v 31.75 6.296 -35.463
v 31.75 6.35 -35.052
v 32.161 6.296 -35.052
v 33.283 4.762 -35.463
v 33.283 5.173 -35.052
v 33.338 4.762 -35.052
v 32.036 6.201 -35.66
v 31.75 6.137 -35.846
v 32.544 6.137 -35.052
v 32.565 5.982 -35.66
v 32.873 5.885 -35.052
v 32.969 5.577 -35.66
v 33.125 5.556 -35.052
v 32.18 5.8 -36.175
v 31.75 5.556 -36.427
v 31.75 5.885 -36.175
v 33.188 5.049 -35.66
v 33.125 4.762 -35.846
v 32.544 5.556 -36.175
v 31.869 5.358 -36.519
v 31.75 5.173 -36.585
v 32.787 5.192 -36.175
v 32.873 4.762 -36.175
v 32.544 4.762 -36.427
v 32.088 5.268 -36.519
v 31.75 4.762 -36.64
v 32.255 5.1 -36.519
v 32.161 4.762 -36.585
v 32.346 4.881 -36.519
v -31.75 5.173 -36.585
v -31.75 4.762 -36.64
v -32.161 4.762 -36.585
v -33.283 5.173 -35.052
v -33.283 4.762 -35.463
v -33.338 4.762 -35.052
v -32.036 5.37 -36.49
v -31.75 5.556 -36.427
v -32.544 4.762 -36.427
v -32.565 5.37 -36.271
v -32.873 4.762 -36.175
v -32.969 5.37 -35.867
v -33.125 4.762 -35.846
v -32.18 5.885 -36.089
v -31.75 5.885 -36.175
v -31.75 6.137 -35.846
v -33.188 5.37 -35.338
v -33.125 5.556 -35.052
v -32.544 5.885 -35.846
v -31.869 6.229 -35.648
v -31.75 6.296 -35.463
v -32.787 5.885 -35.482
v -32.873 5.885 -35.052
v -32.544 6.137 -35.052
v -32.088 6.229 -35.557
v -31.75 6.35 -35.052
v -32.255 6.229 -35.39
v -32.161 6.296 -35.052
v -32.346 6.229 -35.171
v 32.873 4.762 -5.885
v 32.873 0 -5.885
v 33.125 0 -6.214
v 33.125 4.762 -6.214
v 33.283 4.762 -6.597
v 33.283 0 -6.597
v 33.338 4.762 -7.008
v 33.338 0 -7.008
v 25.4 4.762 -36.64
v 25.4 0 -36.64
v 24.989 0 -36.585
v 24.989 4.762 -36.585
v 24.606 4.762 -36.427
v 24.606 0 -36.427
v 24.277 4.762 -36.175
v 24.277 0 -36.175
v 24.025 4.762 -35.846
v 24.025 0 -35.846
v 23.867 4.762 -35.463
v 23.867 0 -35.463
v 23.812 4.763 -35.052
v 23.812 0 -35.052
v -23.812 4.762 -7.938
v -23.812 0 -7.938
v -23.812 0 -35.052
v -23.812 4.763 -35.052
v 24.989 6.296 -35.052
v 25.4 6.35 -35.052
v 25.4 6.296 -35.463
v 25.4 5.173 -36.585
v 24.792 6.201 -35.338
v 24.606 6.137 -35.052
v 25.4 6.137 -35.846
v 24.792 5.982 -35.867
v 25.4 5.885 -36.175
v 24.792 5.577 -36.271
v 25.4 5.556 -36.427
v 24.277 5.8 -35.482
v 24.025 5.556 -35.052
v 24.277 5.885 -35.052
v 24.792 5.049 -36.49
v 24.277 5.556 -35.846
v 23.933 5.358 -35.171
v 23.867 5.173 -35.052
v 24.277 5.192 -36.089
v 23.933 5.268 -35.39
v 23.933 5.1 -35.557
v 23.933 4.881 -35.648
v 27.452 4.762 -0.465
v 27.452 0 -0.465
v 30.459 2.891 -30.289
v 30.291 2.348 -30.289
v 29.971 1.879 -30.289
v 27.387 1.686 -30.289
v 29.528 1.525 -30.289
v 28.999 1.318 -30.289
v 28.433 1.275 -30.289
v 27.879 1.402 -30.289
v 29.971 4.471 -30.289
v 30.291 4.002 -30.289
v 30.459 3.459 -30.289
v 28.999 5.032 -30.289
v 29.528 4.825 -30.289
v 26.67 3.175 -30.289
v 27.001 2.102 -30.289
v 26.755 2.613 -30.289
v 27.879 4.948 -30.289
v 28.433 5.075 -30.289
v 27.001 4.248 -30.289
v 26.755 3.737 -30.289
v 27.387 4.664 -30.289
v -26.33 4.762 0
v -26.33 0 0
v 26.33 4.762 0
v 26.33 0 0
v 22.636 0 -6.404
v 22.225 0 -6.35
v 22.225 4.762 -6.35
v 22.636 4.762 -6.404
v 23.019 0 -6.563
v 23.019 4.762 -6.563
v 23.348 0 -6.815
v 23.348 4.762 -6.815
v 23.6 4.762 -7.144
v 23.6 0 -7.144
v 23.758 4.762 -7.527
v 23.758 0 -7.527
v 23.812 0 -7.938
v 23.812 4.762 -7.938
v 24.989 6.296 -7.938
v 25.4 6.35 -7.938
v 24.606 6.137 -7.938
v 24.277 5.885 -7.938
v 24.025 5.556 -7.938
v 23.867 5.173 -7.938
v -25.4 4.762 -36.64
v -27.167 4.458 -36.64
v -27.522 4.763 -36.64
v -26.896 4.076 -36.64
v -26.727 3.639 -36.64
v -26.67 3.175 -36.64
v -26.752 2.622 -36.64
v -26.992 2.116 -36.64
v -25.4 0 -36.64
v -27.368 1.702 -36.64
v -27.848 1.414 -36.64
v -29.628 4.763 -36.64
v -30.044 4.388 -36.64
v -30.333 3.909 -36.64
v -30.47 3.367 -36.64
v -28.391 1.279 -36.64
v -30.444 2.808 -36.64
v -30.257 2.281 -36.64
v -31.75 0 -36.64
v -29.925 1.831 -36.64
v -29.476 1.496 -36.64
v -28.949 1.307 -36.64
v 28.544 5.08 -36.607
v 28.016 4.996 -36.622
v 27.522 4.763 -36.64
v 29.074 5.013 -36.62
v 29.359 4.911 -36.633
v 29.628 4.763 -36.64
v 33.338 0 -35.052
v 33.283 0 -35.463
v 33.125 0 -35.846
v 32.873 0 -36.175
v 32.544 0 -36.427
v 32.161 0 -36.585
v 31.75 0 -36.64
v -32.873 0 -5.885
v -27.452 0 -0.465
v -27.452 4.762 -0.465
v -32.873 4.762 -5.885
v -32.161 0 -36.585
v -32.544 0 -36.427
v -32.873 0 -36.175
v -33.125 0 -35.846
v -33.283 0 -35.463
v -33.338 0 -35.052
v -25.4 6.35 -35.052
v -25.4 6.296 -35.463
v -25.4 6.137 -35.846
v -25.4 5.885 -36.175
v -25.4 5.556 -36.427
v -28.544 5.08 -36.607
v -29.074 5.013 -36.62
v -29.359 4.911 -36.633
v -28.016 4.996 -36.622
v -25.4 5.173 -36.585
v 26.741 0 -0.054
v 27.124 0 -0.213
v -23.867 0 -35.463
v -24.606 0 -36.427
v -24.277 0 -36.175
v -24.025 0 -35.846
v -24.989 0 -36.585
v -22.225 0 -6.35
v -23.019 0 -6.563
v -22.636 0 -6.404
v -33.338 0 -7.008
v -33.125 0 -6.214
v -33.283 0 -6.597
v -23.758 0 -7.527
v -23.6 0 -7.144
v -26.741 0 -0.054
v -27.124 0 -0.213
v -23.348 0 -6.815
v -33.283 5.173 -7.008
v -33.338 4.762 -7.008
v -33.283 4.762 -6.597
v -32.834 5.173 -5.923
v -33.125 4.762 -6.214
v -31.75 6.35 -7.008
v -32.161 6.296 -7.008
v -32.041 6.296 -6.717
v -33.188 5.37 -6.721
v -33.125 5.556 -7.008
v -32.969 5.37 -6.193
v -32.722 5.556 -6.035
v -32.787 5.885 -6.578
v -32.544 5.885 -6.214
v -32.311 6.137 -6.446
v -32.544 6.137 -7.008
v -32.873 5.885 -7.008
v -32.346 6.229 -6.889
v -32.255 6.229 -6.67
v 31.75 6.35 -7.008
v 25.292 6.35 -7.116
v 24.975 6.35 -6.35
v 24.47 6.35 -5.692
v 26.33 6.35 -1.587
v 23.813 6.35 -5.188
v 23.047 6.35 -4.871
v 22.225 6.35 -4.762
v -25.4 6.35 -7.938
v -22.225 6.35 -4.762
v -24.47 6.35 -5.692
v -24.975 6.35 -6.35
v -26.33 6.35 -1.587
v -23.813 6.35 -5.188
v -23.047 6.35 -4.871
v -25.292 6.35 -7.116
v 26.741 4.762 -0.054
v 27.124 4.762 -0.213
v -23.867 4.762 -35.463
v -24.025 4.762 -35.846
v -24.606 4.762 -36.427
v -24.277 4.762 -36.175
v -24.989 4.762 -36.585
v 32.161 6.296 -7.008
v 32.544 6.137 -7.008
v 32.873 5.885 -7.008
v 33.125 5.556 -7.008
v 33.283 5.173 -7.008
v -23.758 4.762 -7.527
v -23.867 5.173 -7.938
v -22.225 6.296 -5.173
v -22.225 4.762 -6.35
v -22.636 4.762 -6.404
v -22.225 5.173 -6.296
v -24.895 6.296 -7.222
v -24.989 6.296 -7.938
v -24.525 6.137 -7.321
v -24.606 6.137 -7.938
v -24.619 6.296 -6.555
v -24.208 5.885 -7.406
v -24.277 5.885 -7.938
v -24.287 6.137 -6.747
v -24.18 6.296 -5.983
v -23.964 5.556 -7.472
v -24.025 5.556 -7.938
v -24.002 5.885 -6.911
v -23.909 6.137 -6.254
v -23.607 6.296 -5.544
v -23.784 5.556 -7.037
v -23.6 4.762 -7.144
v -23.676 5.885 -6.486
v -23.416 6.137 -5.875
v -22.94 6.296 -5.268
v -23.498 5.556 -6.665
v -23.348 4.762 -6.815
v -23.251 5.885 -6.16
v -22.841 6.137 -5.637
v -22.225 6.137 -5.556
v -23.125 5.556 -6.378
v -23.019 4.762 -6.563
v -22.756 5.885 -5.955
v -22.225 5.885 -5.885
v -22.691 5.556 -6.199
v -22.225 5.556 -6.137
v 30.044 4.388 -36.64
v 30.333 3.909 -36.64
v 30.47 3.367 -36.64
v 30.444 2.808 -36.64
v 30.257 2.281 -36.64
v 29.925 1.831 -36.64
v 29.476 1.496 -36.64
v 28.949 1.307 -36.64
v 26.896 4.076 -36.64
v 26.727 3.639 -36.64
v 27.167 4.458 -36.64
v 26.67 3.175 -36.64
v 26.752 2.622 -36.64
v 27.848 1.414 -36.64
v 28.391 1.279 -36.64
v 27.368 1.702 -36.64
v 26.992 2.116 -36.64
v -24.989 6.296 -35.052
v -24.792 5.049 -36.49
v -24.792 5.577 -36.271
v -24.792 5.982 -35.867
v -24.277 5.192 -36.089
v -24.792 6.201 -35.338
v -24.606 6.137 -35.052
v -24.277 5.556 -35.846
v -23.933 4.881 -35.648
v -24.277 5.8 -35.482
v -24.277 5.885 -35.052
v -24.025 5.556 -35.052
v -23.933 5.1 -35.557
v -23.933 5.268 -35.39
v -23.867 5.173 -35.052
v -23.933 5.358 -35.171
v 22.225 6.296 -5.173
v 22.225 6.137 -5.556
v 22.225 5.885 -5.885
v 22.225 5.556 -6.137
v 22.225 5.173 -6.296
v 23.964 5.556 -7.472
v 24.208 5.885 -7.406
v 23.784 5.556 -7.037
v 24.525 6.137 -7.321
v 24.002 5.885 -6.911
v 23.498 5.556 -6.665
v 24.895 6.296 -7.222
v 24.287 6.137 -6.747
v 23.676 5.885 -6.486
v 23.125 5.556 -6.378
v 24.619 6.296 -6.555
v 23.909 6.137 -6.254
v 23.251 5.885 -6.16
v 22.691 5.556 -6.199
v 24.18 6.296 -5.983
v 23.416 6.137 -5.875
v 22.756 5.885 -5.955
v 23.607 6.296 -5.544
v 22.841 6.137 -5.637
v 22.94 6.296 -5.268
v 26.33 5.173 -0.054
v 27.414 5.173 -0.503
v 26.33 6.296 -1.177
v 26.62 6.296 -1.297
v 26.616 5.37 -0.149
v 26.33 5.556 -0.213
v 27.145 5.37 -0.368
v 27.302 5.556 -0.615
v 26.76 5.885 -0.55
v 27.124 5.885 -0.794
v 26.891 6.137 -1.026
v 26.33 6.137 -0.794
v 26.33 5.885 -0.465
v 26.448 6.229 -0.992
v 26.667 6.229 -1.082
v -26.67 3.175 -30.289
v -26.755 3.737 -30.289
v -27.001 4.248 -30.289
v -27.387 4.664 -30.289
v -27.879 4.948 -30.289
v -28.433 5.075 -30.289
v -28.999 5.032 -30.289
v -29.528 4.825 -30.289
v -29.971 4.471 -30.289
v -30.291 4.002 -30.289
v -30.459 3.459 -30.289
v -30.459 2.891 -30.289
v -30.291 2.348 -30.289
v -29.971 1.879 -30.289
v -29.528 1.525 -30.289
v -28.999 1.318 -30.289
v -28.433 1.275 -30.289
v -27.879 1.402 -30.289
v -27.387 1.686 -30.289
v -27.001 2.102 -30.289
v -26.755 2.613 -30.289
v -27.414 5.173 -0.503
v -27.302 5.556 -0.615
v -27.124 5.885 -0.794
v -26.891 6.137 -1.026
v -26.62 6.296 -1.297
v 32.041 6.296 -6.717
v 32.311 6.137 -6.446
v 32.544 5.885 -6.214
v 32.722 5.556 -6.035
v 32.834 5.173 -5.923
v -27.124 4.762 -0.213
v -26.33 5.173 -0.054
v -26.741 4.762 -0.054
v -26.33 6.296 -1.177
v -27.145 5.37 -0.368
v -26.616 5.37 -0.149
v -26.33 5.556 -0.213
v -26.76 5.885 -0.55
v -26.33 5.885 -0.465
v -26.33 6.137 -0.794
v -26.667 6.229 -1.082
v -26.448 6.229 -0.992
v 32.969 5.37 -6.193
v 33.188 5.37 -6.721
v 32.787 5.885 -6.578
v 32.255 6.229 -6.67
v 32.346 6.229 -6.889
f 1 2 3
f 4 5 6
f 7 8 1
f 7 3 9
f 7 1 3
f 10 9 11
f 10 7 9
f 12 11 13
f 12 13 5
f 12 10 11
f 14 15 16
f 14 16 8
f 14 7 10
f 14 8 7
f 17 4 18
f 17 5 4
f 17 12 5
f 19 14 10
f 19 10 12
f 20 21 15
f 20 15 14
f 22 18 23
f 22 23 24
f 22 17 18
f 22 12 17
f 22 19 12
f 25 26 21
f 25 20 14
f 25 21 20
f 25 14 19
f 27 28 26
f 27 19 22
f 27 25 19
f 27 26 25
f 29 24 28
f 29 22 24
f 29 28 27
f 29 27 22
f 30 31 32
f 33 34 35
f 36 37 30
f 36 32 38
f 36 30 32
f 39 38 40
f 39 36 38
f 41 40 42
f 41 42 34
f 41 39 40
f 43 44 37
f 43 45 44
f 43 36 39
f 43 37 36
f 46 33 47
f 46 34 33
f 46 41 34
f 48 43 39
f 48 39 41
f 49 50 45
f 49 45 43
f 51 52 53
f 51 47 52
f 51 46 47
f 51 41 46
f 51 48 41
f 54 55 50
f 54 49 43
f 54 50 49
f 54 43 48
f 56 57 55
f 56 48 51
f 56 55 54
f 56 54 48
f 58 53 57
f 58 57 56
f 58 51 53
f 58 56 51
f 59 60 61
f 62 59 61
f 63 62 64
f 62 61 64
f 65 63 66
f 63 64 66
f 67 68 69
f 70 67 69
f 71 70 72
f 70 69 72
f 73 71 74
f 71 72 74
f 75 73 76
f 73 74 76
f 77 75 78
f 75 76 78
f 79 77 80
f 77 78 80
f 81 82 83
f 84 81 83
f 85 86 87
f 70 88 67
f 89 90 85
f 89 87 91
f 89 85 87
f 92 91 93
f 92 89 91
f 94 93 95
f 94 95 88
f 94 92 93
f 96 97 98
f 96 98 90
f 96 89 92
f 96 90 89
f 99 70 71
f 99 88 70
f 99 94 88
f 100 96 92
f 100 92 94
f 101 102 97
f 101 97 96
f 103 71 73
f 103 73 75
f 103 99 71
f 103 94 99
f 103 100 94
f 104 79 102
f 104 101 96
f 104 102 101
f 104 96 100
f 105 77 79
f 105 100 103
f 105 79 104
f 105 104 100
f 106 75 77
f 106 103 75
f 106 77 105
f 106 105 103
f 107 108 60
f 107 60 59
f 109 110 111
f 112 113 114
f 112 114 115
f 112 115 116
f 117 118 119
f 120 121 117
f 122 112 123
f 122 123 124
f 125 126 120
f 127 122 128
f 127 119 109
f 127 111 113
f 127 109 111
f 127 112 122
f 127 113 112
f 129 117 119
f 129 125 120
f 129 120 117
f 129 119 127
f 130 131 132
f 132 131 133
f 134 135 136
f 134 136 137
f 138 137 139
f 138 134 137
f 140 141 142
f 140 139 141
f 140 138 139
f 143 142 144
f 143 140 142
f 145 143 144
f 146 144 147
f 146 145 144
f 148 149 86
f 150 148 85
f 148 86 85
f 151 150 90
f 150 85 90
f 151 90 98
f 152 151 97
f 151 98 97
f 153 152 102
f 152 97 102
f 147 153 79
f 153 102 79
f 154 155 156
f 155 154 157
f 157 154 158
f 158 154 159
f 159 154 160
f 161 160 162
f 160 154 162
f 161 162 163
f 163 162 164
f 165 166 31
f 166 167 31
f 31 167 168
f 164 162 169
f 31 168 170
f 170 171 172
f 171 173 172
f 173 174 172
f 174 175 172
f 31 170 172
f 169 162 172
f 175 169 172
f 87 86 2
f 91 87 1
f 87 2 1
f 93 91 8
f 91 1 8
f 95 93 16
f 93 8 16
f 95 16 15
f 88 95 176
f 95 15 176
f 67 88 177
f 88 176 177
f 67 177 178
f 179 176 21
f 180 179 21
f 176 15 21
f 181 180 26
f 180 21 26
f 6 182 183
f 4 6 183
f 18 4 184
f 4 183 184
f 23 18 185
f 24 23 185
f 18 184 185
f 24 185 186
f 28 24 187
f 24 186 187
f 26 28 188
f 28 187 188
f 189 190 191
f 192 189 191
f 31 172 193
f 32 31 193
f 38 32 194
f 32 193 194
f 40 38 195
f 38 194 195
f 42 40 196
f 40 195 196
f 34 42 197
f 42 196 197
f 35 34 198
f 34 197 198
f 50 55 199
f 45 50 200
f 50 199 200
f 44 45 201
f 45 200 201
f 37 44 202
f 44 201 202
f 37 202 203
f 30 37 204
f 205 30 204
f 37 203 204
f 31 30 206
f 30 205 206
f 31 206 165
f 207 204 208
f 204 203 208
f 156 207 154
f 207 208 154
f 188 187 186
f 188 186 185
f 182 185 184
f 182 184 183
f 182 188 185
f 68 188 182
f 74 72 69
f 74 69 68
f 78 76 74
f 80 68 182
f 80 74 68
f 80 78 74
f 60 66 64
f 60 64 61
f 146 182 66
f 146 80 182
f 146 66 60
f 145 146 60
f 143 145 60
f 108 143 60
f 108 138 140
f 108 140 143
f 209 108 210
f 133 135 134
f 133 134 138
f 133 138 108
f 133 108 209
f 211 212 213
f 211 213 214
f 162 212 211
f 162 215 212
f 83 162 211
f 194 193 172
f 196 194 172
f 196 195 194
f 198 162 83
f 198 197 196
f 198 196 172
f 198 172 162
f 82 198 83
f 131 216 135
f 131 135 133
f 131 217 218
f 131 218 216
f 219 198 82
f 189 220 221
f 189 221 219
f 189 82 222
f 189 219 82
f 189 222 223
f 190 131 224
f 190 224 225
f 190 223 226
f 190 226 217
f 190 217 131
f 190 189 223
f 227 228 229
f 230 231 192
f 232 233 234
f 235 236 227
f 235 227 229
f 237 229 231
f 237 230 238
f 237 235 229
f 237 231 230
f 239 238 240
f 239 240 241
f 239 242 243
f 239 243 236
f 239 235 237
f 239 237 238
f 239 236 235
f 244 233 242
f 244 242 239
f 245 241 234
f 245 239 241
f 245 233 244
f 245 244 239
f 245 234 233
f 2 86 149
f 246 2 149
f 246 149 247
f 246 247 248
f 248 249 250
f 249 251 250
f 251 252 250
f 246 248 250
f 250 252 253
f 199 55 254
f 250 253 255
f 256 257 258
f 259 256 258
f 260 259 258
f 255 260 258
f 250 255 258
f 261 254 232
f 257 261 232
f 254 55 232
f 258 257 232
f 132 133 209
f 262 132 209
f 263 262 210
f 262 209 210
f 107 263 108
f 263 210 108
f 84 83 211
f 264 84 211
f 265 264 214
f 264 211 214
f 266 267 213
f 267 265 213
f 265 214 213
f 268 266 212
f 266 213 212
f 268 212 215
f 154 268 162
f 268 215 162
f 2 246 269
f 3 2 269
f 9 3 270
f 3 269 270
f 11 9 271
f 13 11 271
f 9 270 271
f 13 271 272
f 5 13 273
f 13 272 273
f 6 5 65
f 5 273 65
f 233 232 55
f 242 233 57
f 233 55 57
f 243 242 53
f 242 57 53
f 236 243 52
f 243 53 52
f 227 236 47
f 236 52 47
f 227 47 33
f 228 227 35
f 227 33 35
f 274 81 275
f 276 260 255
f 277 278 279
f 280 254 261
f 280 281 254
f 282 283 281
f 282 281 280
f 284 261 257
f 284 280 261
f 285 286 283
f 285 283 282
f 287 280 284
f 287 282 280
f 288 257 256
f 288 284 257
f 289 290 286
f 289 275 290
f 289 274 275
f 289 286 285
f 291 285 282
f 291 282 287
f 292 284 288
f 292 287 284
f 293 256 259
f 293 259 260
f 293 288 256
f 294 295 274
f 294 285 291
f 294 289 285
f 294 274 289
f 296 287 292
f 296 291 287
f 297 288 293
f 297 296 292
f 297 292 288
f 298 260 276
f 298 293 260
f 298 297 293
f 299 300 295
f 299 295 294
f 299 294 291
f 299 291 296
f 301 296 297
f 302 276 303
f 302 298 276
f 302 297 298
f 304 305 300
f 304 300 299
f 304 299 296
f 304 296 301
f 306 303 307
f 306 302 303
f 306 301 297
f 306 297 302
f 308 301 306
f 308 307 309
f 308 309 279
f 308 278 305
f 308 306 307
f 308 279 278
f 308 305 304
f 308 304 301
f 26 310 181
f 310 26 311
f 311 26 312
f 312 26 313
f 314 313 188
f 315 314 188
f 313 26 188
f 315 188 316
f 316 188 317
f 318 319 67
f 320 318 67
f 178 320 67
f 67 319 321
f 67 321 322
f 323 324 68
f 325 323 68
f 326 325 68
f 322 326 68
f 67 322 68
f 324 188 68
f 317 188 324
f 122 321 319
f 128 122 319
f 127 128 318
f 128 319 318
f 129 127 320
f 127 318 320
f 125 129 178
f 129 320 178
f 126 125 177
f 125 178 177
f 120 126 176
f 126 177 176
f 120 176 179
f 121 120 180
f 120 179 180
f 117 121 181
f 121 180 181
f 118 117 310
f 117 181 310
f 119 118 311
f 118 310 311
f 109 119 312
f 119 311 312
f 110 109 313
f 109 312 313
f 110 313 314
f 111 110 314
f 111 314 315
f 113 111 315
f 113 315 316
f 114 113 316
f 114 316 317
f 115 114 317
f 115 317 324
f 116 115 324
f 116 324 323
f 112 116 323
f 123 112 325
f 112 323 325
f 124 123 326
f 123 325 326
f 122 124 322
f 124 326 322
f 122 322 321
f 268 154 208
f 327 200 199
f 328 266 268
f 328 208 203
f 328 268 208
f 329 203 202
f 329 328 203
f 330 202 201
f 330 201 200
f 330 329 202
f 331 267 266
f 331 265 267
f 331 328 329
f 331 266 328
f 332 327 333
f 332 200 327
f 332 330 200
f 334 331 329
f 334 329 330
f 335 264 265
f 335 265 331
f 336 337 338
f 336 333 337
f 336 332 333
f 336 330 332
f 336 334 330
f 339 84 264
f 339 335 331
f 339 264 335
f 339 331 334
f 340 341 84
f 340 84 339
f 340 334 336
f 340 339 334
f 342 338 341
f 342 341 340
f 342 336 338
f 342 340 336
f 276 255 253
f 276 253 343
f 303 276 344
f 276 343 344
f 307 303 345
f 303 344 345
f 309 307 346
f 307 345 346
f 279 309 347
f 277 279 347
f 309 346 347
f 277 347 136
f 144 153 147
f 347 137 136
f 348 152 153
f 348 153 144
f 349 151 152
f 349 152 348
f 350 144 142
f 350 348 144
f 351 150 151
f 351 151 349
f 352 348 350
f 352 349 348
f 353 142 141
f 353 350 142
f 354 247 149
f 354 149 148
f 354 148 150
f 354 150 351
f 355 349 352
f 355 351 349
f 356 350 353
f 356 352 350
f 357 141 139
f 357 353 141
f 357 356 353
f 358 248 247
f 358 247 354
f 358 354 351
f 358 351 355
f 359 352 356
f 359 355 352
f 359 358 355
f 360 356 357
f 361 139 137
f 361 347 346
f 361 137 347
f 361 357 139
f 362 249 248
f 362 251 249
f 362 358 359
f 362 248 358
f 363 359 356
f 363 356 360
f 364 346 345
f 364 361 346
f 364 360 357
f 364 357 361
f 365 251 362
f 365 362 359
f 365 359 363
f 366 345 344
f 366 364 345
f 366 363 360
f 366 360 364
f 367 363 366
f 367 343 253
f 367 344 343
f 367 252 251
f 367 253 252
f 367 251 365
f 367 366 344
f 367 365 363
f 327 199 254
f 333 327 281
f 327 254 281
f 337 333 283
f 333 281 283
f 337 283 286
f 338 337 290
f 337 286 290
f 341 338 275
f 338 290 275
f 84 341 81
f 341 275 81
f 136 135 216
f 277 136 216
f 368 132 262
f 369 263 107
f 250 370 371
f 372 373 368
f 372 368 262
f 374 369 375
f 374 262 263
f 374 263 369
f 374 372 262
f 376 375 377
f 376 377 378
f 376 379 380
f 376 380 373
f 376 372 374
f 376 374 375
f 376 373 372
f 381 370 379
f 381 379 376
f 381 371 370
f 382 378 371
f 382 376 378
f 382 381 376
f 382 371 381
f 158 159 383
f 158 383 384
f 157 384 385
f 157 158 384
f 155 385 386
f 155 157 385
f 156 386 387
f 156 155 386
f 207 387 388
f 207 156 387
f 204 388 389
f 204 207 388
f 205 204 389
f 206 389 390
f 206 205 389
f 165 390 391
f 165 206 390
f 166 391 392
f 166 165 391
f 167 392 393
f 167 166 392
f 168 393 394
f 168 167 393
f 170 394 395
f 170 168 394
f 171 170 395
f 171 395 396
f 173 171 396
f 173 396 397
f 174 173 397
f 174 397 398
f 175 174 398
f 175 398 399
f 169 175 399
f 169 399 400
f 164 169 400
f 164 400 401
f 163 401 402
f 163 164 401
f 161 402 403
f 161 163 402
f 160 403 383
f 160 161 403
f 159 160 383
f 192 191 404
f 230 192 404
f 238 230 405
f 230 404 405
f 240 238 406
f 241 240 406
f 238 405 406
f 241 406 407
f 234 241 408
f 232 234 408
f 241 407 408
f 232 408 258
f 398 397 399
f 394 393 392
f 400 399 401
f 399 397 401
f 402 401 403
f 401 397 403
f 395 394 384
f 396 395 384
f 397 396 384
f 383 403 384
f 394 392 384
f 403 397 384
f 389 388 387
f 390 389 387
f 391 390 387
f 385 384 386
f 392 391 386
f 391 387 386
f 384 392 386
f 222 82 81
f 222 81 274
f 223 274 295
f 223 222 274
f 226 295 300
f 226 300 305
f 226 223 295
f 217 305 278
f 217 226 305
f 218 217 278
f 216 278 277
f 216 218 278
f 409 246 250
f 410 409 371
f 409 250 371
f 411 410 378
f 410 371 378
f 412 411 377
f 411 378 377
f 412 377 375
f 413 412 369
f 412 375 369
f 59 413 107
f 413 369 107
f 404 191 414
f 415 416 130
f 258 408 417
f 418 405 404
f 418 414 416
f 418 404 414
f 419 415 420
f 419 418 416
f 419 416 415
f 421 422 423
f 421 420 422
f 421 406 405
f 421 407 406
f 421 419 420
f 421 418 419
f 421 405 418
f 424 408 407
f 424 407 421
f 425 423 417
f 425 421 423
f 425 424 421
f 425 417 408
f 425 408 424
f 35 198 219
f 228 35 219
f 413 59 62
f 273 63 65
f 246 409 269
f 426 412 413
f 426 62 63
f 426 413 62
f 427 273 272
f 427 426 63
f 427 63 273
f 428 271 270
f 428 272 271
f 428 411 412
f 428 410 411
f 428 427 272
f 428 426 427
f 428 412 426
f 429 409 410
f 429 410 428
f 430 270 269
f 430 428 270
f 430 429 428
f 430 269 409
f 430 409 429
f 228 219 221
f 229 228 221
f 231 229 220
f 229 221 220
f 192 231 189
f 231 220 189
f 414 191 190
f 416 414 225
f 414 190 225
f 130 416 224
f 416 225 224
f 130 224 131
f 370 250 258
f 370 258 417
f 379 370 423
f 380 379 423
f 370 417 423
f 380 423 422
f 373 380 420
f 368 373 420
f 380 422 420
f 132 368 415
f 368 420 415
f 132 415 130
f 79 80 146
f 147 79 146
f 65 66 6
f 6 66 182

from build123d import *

# Parameters (mm, degrees)
BOSS_EXTRUDE1_DEPTH = 6.35
SKETCH2_R           = 1.905
CUT_EXTRUDE1_DEPTH  = 6.35
CHAMFER1_SIZE       = 6.35
FILLET2_R           = 1.5875


with BuildPart() as part:
    # Sketch1 → Boss-Extrude1 (new body)
    with BuildSketch(Plane(origin=(0, 0, 0), x_dir=(1, 0, 0), z_dir=(0, 1, 0))):
        Polygon((-33.3375, 0), (33.3375, 0), (33.3375, 36.6395), (23.8125, 36.6395), (23.8125, 6.35), (-23.8125, 6.35), (-23.8125, 36.6395), (-33.3375, 36.6395), align=None)
    extrude(amount=BOSS_EXTRUDE1_DEPTH)

    # Sketch2 → Cut-Extrude1 (cut)
    with BuildSketch(Plane(origin=(0, 0, -36.6395), x_dir=(-1, 0, 0), z_dir=(0, 0, -1))):
        with Locations((-28.575, 3.175)):
            Circle(SKETCH2_R)
    cut_extrude1 = extrude(amount=-CUT_EXTRUDE1_DEPTH, mode=Mode.SUBTRACT)

    # Mirror1: Cut-Extrude1 across plane
    add(cut_extrude1.mirror(Plane(origin=(0, 0, 0), x_dir=(0, 0, 1), z_dir=(1, 0, 0))), mode=Mode.SUBTRACT)

    # Chamfer1
    chamfer1_edges = [part.edges().sort_by_distance(p)[0] for p in [
        (33.3375, 3.175, 0),
        (-33.3375, 3.175, 0),
    ]]
    chamfer(chamfer1_edges, length=CHAMFER1_SIZE)

    # Fillet2
    # the kernel refuses this fillet: 1.5875 mm, written as the material it adds along each edge
    with BuildSketch(Plane(origin=(-23.8125, 0, -6.35), x_dir=(0, 0, -1), z_dir=(0, 1, 0))) as fillet2_piece_1:
        with BuildLine():
            CenterArc((FILLET2_R, -FILLET2_R), FILLET2_R, 90, 90)
            Line((0, -FILLET2_R), (0, 0))
            Line((0, 0), (FILLET2_R, 0))
        make_face()
    extrude(amount=6.35)
    with BuildSketch(Plane(origin=(23.8125, 0, -6.35), x_dir=(0, 0, -1), z_dir=(0, 1, 0))) as fillet2_piece_2:
        with BuildLine():
            CenterArc((FILLET2_R, FILLET2_R), FILLET2_R, 180, 90)
            Line((0, FILLET2_R), (0, 0))
            Line((0, 0), (FILLET2_R, 0))
        make_face()
    extrude(amount=6.35)
    # the kernel refuses this fillet: 1.5875 mm, written as the material it takes off along each edge
    with BuildSketch(Plane(origin=(-31.75, 4.7625, -35.052), x_dir=(-1, 0, 0), z_dir=(0, 1, 0))) as fillet2_2_piece_1_section:
        Polygon((0, 0), (FILLET2_R, 0), (FILLET2_R, -FILLET2_R), (0, -FILLET2_R), align=None)
    fillet2_2_piece_1 = extrude(amount=FILLET2_R, mode=Mode.PRIVATE)
    fillet2_2_piece_1 = fillet2_2_piece_1 - Plane(origin=(-31.75, 4.7625, -35.052), x_dir=(0.7071067811865475, 0, 0.7071067811865475), z_dir=(0, 1, 0)) * Sphere(FILLET2_R, mode=Mode.PRIVATE)
    add(fillet2_2_piece_1, mode=Mode.SUBTRACT)
    with BuildSketch(Plane(origin=(31.75, 4.7625, -35.052), x_dir=(0, 1, 0), z_dir=(0, 0, -1))) as fillet2_2_piece_2_section:
        Polygon((0, 0), (FILLET2_R, 0), (FILLET2_R, FILLET2_R), (0, FILLET2_R), align=None)
    fillet2_2_piece_2 = extrude(amount=FILLET2_R, mode=Mode.PRIVATE)
    fillet2_2_piece_2 = fillet2_2_piece_2 - Plane(origin=(31.75, 4.7625, -35.052), x_dir=(-0.7071067811865475, -0.7071067811865475, 0), z_dir=(0, 0, -1)) * Sphere(FILLET2_R, mode=Mode.PRIVATE)
    add(fillet2_2_piece_2, mode=Mode.SUBTRACT)
    with BuildSketch(Plane(origin=(-26.32993597, 4.7625, -1.5875), x_dir=(0, 0, 1), z_dir=(0, 1, 0))) as fillet2_2_piece_3_section:
        Polygon((0, 0), (FILLET2_R, 0), (FILLET2_R, -FILLET2_R * 0.414213562373), (FILLET2_R * 0.707106781187, -FILLET2_R * 0.707106781187), align=None)
    fillet2_2_piece_3 = extrude(amount=FILLET2_R, mode=Mode.PRIVATE)
    fillet2_2_piece_3 = fillet2_2_piece_3 - Plane(origin=(-26.32993597, 4.7625, -1.5875), x_dir=(0.38268343236508956, 0, -0.9238795325112867), z_dir=(0, 1, 0)) * Sphere(FILLET2_R, mode=Mode.PRIVATE)
    add(fillet2_2_piece_3, mode=Mode.SUBTRACT)
    with BuildSketch(Plane(origin=(26.32993597, 4.7625, -1.5875), x_dir=(0, 0, 1), z_dir=(0, 1, 0))) as fillet2_2_piece_4_section:
        Polygon((0, 0), (FILLET2_R, 0), (FILLET2_R, FILLET2_R * 0.414213562373), (FILLET2_R * 0.707106781187, FILLET2_R * 0.707106781187), align=None)
    fillet2_2_piece_4 = extrude(amount=FILLET2_R, mode=Mode.PRIVATE)
    fillet2_2_piece_4 = fillet2_2_piece_4 - Plane(origin=(26.32993597, 4.7625, -1.5875), x_dir=(-0.3826834323650899, 0, -0.9238795325112866), z_dir=(0, 1, 0)) * Sphere(FILLET2_R, mode=Mode.PRIVATE)
    add(fillet2_2_piece_4, mode=Mode.SUBTRACT)
    with BuildSketch(Plane(origin=(-31.75, 4.7625, -7.00756403), x_dir=(-1, 0, 0), z_dir=(0, 1, 0))) as fillet2_2_piece_5_section:
        Polygon((0, 0), (FILLET2_R, 0), (FILLET2_R, FILLET2_R * 0.414213562373), (FILLET2_R * 0.707106781187, FILLET2_R * 0.707106781187), align=None)
    fillet2_2_piece_5 = extrude(amount=FILLET2_R, mode=Mode.PRIVATE)
    fillet2_2_piece_5 = fillet2_2_piece_5 - Plane(origin=(-31.75, 4.7625, -7.00756403), x_dir=(0.9238795325112866, 0, -0.38268343236508984), z_dir=(0, 1, 0)) * Sphere(FILLET2_R, mode=Mode.PRIVATE)
    add(fillet2_2_piece_5, mode=Mode.SUBTRACT)
    with BuildSketch(Plane(origin=(31.75, 4.7625, -7.00756403), x_dir=(1, 0, 0), z_dir=(0, 1, 0))) as fillet2_2_piece_6_section:
        Polygon((0, 0), (FILLET2_R, 0), (FILLET2_R, -FILLET2_R * 0.414213562373), (FILLET2_R * 0.707106781187, -FILLET2_R * 0.707106781187), align=None)
    fillet2_2_piece_6 = extrude(amount=FILLET2_R, mode=Mode.PRIVATE)
    fillet2_2_piece_6 = fillet2_2_piece_6 - Plane(origin=(31.75, 4.7625, -7.00756403), x_dir=(-0.9238795325112868, 0, -0.38268343236508967), z_dir=(0, 1, 0)) * Sphere(FILLET2_R, mode=Mode.PRIVATE)
    add(fillet2_2_piece_6, mode=Mode.SUBTRACT)
    with BuildSketch(Plane(origin=(-33.3375, -3.96875, -36.6395), x_dir=(0, 0, 1), z_dir=(0, 1, 0))) as fillet2_2_piece_7:
        with BuildLine():
            CenterArc((FILLET2_R, FILLET2_R), FILLET2_R, 180, 90)
            Line((0, FILLET2_R), (0, 0))
            Line((0, 0), (FILLET2_R, 0))
        make_face()
    extrude(amount=8.73125, mode=Mode.SUBTRACT)
    with BuildSketch(Plane(origin=(-23.8125, -3.96875, -36.6395), x_dir=(-1, 0, 0), z_dir=(0, 1, 0))) as fillet2_2_piece_8:
        with BuildLine():
            CenterArc((FILLET2_R, FILLET2_R), FILLET2_R, 180, 90)
            Line((0, FILLET2_R), (0, 0))
            Line((0, 0), (FILLET2_R, 0))
        make_face()
    extrude(amount=14.2875, mode=Mode.SUBTRACT)
    with BuildSketch(Plane(origin=(23.8125, -3.96875, -36.6395), x_dir=(1, 0, 0), z_dir=(0, 1, 0))) as fillet2_2_piece_9:
        with BuildLine():
            CenterArc((FILLET2_R, -FILLET2_R), FILLET2_R, 90, 90)
            Line((0, -FILLET2_R), (0, 0))
            Line((0, 0), (FILLET2_R, 0))
        make_face()
    extrude(amount=14.2875, mode=Mode.SUBTRACT)
    with BuildSketch(Plane(origin=(33.3375, -3.96875, -36.6395), x_dir=(0, 0, 1), z_dir=(0, 1, 0))) as fillet2_2_piece_10:
        with BuildLine():
            CenterArc((FILLET2_R, -FILLET2_R), FILLET2_R, 90, 90)
            Line((0, -FILLET2_R), (0, 0))
            Line((0, 0), (FILLET2_R, 0))
        make_face()
    extrude(amount=8.73125, mode=Mode.SUBTRACT)
    with BuildSketch(Plane(origin=(31.75, 6.35, -36.6395), x_dir=(0, 0, 1), z_dir=(-1, 0, 0)), Plane(origin=(-19.84375, 6.35, -36.6395), x_dir=(0, 0, 1), z_dir=(-1, 0, 0))) as fillet2_2_piece_11:
        with BuildLine():
            CenterArc((FILLET2_R, -FILLET2_R), FILLET2_R, 90, 90)
            Line((0, -FILLET2_R), (0, 0))
            Line((0, 0), (FILLET2_R, 0))
        make_face()
    extrude(amount=11.90625, mode=Mode.SUBTRACT)
    with BuildSketch(Plane(origin=(-26.32993597, 6.35, 0), x_dir=(0, -1, 0), z_dir=(1, 0, 0))) as fillet2_2_piece_12:
        with BuildLine():
            CenterArc((FILLET2_R, FILLET2_R), FILLET2_R, 180, 90)
            Line((0, FILLET2_R), (0, 0))
            Line((0, 0), (FILLET2_R, 0))
        make_face()
    extrude(amount=52.659871939, mode=Mode.SUBTRACT)
    with BuildSketch(Plane(origin=(26.9875, -1.643910076, 0), x_dir=(-1, 0, 0), z_dir=(0, 1, 0)), Plane(origin=(33.3375, -1.643910076, -6.35), x_dir=(-0.7071067811865448, 0, 0.7071067811865502), z_dir=(0, 1, 0))) as fillet2_2_piece_13:
        with BuildLine():
            CenterArc((FILLET2_R * 0.414213562373, -FILLET2_R), FILLET2_R, 90, 45)
            Line((-FILLET2_R * 0.292893218813, -FILLET2_R * 0.292893218813), (0, 0))
            Line((0, 0), (FILLET2_R * 0.414213562373, 0))
        make_face()
    extrude(amount=6.406410076, mode=Mode.SUBTRACT)
    with BuildSketch(Plane(origin=(-26.9875, -1.643910076, 0), x_dir=(1, 0, 0), z_dir=(0, 1, 0)), Plane(origin=(-33.3375, -1.643910076, -6.35), x_dir=(0.7071067811865468, 0, 0.7071067811865482), z_dir=(0, 1, 0))) as fillet2_2_piece_14:
        with BuildLine():
            CenterArc((FILLET2_R * 0.414213562373, FILLET2_R), FILLET2_R, 225, 45)
            Line((-FILLET2_R * 0.292893218813, FILLET2_R * 0.292893218813), (0, 0))
            Line((0, 0), (FILLET2_R * 0.414213562373, 0))
        make_face()
    extrude(amount=6.406410076, mode=Mode.SUBTRACT)
    with BuildSketch(Plane(origin=(33.3375, 6.35, -7.00756403), x_dir=(-1, 0, 0), z_dir=(0, 0, -1)), Plane(origin=(-33.3375, 6.35, -35.052), x_dir=(1, 0, 0), z_dir=(0, 0, 1))) as fillet2_2_piece_15:
        with BuildLine():
            CenterArc((FILLET2_R, -FILLET2_R), FILLET2_R, 90, 90)
            Line((0, -FILLET2_R), (0, 0))
            Line((0, 0), (FILLET2_R, 0))
        make_face()
    extrude(amount=28.04443597, mode=Mode.SUBTRACT)
    with BuildSketch(Plane(origin=(27.452467985, 6.35, -0.464967985), x_dir=(0, -1, 0), z_dir=(0.7071067811865476, 0, -0.7071067811865476))) as fillet2_2_piece_16:
        with BuildLine():
            CenterArc((FILLET2_R, FILLET2_R), FILLET2_R, 180, 90)
            Line((0, FILLET2_R), (0, 0))
            Line((0, 0), (FILLET2_R, 0))
        make_face()
    extrude(amount=7.665128061, mode=Mode.SUBTRACT)
    with BuildSketch(Plane(origin=(-27.452467985, 6.35, -0.464967985), x_dir=(0, -1, 0), z_dir=(-0.7071067811865477, 0, -0.7071067811865475))) as fillet2_2_piece_17:
        with BuildLine():
            CenterArc((FILLET2_R, -FILLET2_R), FILLET2_R, 90, 90)
            Line((0, -FILLET2_R), (0, 0))
            Line((0, 0), (FILLET2_R, 0))
        make_face()
    extrude(amount=7.665128061, mode=Mode.SUBTRACT)
    # the kernel refuses this fillet: 1.5875 mm, written as the material it takes off along each edge
    with BuildSketch(Plane(origin=(-25.4, 4.7625, -35.052), x_dir=(0, 1, 0), z_dir=(1, 0, 0))) as fillet2_3_piece_1_section:
        Polygon((0, 0), (FILLET2_R, 0), (FILLET2_R, -FILLET2_R), (0, -FILLET2_R), align=None)
    fillet2_3_piece_1 = extrude(amount=FILLET2_R, mode=Mode.PRIVATE)
    fillet2_3_piece_1 = fillet2_3_piece_1 - Plane(origin=(-25.4, 4.7625, -35.052), x_dir=(0, -0.7071067811865475, 0.7071067811865475), z_dir=(1, 0, 0)) * Sphere(FILLET2_R, mode=Mode.PRIVATE)
    add(fillet2_3_piece_1, mode=Mode.SUBTRACT)
    with BuildSketch(Plane(origin=(25.4, 4.7625, -35.052), x_dir=(0, 1, 0), z_dir=(-1, 0, 0))) as fillet2_3_piece_2_section:
        Polygon((0, 0), (FILLET2_R, 0), (FILLET2_R, FILLET2_R), (0, FILLET2_R), align=None)
    fillet2_3_piece_2 = extrude(amount=FILLET2_R, mode=Mode.PRIVATE)
    fillet2_3_piece_2 = fillet2_3_piece_2 - Plane(origin=(25.4, 4.7625, -35.052), x_dir=(0, -0.7071067811865475, 0.7071067811865475), z_dir=(-1, 0, 0)) * Sphere(FILLET2_R, mode=Mode.PRIVATE)
    add(fillet2_3_piece_2, mode=Mode.SUBTRACT)
    with BuildSketch(Plane(origin=(23.8125, 6.35, -35.052), x_dir=(0, -1, 0), z_dir=(0, 0, 1)), Plane(origin=(-23.8125, 6.35, -7.9375), x_dir=(0, -1, 0), z_dir=(0, 0, -1))) as fillet2_3_piece_3:
        with BuildLine():
            CenterArc((FILLET2_R, FILLET2_R), FILLET2_R, 180, 90)
            Line((0, FILLET2_R), (0, 0))
            Line((0, 0), (FILLET2_R, 0))
        make_face()
    extrude(amount=27.1145, mode=Mode.SUBTRACT)
    with BuildSketch(Plane(origin=(22.225, 6.35, -6.35), x_dir=(0, -1, 0), z_dir=(-1, 0, 0))) as fillet2_3_piece_4:
        with BuildLine():
            CenterArc((FILLET2_R, FILLET2_R), FILLET2_R, 180, 90)
            Line((0, FILLET2_R), (0, 0))
            Line((0, 0), (FILLET2_R, 0))
        make_face()
    extrude(amount=44.45, mode=Mode.SUBTRACT)
    with BuildSketch(Plane(origin=(-22.225, 6.35, -7.9375), x_dir=(-1, 0, 0), z_dir=(0, 0, -1))) as fillet2_3_piece_5:
        with BuildLine():
            CenterArc((1.5875 + FILLET2_R, -FILLET2_R), FILLET2_R, 90, 90)
            Line((1.5875 + FILLET2_R, 0), (1.5875, 0))
            Line((1.5875, 0), (1.5875, -FILLET2_R))
        make_face()
    revolve(axis=Axis((-22.225, 6.35, -7.9375), (0, 1, 0)), revolution_arc=90, mode=Mode.SUBTRACT)
    with BuildSketch(Plane(origin=(22.225, 6.35, -7.9375), x_dir=(1, 0, 0), z_dir=(0, 0, -1))) as fillet2_3_piece_6:
        with BuildLine():
            CenterArc((1.5875 + FILLET2_R, FILLET2_R), FILLET2_R, 180, 90)
            Line((1.5875 + FILLET2_R, 0), (1.5875, 0))
            Line((1.5875, 0), (1.5875, FILLET2_R))
        make_face()
    revolve(axis=Axis((22.225, 6.35, -7.9375), (0, -1, 0)), revolution_arc=90, mode=Mode.SUBTRACT)


solid = part.part
